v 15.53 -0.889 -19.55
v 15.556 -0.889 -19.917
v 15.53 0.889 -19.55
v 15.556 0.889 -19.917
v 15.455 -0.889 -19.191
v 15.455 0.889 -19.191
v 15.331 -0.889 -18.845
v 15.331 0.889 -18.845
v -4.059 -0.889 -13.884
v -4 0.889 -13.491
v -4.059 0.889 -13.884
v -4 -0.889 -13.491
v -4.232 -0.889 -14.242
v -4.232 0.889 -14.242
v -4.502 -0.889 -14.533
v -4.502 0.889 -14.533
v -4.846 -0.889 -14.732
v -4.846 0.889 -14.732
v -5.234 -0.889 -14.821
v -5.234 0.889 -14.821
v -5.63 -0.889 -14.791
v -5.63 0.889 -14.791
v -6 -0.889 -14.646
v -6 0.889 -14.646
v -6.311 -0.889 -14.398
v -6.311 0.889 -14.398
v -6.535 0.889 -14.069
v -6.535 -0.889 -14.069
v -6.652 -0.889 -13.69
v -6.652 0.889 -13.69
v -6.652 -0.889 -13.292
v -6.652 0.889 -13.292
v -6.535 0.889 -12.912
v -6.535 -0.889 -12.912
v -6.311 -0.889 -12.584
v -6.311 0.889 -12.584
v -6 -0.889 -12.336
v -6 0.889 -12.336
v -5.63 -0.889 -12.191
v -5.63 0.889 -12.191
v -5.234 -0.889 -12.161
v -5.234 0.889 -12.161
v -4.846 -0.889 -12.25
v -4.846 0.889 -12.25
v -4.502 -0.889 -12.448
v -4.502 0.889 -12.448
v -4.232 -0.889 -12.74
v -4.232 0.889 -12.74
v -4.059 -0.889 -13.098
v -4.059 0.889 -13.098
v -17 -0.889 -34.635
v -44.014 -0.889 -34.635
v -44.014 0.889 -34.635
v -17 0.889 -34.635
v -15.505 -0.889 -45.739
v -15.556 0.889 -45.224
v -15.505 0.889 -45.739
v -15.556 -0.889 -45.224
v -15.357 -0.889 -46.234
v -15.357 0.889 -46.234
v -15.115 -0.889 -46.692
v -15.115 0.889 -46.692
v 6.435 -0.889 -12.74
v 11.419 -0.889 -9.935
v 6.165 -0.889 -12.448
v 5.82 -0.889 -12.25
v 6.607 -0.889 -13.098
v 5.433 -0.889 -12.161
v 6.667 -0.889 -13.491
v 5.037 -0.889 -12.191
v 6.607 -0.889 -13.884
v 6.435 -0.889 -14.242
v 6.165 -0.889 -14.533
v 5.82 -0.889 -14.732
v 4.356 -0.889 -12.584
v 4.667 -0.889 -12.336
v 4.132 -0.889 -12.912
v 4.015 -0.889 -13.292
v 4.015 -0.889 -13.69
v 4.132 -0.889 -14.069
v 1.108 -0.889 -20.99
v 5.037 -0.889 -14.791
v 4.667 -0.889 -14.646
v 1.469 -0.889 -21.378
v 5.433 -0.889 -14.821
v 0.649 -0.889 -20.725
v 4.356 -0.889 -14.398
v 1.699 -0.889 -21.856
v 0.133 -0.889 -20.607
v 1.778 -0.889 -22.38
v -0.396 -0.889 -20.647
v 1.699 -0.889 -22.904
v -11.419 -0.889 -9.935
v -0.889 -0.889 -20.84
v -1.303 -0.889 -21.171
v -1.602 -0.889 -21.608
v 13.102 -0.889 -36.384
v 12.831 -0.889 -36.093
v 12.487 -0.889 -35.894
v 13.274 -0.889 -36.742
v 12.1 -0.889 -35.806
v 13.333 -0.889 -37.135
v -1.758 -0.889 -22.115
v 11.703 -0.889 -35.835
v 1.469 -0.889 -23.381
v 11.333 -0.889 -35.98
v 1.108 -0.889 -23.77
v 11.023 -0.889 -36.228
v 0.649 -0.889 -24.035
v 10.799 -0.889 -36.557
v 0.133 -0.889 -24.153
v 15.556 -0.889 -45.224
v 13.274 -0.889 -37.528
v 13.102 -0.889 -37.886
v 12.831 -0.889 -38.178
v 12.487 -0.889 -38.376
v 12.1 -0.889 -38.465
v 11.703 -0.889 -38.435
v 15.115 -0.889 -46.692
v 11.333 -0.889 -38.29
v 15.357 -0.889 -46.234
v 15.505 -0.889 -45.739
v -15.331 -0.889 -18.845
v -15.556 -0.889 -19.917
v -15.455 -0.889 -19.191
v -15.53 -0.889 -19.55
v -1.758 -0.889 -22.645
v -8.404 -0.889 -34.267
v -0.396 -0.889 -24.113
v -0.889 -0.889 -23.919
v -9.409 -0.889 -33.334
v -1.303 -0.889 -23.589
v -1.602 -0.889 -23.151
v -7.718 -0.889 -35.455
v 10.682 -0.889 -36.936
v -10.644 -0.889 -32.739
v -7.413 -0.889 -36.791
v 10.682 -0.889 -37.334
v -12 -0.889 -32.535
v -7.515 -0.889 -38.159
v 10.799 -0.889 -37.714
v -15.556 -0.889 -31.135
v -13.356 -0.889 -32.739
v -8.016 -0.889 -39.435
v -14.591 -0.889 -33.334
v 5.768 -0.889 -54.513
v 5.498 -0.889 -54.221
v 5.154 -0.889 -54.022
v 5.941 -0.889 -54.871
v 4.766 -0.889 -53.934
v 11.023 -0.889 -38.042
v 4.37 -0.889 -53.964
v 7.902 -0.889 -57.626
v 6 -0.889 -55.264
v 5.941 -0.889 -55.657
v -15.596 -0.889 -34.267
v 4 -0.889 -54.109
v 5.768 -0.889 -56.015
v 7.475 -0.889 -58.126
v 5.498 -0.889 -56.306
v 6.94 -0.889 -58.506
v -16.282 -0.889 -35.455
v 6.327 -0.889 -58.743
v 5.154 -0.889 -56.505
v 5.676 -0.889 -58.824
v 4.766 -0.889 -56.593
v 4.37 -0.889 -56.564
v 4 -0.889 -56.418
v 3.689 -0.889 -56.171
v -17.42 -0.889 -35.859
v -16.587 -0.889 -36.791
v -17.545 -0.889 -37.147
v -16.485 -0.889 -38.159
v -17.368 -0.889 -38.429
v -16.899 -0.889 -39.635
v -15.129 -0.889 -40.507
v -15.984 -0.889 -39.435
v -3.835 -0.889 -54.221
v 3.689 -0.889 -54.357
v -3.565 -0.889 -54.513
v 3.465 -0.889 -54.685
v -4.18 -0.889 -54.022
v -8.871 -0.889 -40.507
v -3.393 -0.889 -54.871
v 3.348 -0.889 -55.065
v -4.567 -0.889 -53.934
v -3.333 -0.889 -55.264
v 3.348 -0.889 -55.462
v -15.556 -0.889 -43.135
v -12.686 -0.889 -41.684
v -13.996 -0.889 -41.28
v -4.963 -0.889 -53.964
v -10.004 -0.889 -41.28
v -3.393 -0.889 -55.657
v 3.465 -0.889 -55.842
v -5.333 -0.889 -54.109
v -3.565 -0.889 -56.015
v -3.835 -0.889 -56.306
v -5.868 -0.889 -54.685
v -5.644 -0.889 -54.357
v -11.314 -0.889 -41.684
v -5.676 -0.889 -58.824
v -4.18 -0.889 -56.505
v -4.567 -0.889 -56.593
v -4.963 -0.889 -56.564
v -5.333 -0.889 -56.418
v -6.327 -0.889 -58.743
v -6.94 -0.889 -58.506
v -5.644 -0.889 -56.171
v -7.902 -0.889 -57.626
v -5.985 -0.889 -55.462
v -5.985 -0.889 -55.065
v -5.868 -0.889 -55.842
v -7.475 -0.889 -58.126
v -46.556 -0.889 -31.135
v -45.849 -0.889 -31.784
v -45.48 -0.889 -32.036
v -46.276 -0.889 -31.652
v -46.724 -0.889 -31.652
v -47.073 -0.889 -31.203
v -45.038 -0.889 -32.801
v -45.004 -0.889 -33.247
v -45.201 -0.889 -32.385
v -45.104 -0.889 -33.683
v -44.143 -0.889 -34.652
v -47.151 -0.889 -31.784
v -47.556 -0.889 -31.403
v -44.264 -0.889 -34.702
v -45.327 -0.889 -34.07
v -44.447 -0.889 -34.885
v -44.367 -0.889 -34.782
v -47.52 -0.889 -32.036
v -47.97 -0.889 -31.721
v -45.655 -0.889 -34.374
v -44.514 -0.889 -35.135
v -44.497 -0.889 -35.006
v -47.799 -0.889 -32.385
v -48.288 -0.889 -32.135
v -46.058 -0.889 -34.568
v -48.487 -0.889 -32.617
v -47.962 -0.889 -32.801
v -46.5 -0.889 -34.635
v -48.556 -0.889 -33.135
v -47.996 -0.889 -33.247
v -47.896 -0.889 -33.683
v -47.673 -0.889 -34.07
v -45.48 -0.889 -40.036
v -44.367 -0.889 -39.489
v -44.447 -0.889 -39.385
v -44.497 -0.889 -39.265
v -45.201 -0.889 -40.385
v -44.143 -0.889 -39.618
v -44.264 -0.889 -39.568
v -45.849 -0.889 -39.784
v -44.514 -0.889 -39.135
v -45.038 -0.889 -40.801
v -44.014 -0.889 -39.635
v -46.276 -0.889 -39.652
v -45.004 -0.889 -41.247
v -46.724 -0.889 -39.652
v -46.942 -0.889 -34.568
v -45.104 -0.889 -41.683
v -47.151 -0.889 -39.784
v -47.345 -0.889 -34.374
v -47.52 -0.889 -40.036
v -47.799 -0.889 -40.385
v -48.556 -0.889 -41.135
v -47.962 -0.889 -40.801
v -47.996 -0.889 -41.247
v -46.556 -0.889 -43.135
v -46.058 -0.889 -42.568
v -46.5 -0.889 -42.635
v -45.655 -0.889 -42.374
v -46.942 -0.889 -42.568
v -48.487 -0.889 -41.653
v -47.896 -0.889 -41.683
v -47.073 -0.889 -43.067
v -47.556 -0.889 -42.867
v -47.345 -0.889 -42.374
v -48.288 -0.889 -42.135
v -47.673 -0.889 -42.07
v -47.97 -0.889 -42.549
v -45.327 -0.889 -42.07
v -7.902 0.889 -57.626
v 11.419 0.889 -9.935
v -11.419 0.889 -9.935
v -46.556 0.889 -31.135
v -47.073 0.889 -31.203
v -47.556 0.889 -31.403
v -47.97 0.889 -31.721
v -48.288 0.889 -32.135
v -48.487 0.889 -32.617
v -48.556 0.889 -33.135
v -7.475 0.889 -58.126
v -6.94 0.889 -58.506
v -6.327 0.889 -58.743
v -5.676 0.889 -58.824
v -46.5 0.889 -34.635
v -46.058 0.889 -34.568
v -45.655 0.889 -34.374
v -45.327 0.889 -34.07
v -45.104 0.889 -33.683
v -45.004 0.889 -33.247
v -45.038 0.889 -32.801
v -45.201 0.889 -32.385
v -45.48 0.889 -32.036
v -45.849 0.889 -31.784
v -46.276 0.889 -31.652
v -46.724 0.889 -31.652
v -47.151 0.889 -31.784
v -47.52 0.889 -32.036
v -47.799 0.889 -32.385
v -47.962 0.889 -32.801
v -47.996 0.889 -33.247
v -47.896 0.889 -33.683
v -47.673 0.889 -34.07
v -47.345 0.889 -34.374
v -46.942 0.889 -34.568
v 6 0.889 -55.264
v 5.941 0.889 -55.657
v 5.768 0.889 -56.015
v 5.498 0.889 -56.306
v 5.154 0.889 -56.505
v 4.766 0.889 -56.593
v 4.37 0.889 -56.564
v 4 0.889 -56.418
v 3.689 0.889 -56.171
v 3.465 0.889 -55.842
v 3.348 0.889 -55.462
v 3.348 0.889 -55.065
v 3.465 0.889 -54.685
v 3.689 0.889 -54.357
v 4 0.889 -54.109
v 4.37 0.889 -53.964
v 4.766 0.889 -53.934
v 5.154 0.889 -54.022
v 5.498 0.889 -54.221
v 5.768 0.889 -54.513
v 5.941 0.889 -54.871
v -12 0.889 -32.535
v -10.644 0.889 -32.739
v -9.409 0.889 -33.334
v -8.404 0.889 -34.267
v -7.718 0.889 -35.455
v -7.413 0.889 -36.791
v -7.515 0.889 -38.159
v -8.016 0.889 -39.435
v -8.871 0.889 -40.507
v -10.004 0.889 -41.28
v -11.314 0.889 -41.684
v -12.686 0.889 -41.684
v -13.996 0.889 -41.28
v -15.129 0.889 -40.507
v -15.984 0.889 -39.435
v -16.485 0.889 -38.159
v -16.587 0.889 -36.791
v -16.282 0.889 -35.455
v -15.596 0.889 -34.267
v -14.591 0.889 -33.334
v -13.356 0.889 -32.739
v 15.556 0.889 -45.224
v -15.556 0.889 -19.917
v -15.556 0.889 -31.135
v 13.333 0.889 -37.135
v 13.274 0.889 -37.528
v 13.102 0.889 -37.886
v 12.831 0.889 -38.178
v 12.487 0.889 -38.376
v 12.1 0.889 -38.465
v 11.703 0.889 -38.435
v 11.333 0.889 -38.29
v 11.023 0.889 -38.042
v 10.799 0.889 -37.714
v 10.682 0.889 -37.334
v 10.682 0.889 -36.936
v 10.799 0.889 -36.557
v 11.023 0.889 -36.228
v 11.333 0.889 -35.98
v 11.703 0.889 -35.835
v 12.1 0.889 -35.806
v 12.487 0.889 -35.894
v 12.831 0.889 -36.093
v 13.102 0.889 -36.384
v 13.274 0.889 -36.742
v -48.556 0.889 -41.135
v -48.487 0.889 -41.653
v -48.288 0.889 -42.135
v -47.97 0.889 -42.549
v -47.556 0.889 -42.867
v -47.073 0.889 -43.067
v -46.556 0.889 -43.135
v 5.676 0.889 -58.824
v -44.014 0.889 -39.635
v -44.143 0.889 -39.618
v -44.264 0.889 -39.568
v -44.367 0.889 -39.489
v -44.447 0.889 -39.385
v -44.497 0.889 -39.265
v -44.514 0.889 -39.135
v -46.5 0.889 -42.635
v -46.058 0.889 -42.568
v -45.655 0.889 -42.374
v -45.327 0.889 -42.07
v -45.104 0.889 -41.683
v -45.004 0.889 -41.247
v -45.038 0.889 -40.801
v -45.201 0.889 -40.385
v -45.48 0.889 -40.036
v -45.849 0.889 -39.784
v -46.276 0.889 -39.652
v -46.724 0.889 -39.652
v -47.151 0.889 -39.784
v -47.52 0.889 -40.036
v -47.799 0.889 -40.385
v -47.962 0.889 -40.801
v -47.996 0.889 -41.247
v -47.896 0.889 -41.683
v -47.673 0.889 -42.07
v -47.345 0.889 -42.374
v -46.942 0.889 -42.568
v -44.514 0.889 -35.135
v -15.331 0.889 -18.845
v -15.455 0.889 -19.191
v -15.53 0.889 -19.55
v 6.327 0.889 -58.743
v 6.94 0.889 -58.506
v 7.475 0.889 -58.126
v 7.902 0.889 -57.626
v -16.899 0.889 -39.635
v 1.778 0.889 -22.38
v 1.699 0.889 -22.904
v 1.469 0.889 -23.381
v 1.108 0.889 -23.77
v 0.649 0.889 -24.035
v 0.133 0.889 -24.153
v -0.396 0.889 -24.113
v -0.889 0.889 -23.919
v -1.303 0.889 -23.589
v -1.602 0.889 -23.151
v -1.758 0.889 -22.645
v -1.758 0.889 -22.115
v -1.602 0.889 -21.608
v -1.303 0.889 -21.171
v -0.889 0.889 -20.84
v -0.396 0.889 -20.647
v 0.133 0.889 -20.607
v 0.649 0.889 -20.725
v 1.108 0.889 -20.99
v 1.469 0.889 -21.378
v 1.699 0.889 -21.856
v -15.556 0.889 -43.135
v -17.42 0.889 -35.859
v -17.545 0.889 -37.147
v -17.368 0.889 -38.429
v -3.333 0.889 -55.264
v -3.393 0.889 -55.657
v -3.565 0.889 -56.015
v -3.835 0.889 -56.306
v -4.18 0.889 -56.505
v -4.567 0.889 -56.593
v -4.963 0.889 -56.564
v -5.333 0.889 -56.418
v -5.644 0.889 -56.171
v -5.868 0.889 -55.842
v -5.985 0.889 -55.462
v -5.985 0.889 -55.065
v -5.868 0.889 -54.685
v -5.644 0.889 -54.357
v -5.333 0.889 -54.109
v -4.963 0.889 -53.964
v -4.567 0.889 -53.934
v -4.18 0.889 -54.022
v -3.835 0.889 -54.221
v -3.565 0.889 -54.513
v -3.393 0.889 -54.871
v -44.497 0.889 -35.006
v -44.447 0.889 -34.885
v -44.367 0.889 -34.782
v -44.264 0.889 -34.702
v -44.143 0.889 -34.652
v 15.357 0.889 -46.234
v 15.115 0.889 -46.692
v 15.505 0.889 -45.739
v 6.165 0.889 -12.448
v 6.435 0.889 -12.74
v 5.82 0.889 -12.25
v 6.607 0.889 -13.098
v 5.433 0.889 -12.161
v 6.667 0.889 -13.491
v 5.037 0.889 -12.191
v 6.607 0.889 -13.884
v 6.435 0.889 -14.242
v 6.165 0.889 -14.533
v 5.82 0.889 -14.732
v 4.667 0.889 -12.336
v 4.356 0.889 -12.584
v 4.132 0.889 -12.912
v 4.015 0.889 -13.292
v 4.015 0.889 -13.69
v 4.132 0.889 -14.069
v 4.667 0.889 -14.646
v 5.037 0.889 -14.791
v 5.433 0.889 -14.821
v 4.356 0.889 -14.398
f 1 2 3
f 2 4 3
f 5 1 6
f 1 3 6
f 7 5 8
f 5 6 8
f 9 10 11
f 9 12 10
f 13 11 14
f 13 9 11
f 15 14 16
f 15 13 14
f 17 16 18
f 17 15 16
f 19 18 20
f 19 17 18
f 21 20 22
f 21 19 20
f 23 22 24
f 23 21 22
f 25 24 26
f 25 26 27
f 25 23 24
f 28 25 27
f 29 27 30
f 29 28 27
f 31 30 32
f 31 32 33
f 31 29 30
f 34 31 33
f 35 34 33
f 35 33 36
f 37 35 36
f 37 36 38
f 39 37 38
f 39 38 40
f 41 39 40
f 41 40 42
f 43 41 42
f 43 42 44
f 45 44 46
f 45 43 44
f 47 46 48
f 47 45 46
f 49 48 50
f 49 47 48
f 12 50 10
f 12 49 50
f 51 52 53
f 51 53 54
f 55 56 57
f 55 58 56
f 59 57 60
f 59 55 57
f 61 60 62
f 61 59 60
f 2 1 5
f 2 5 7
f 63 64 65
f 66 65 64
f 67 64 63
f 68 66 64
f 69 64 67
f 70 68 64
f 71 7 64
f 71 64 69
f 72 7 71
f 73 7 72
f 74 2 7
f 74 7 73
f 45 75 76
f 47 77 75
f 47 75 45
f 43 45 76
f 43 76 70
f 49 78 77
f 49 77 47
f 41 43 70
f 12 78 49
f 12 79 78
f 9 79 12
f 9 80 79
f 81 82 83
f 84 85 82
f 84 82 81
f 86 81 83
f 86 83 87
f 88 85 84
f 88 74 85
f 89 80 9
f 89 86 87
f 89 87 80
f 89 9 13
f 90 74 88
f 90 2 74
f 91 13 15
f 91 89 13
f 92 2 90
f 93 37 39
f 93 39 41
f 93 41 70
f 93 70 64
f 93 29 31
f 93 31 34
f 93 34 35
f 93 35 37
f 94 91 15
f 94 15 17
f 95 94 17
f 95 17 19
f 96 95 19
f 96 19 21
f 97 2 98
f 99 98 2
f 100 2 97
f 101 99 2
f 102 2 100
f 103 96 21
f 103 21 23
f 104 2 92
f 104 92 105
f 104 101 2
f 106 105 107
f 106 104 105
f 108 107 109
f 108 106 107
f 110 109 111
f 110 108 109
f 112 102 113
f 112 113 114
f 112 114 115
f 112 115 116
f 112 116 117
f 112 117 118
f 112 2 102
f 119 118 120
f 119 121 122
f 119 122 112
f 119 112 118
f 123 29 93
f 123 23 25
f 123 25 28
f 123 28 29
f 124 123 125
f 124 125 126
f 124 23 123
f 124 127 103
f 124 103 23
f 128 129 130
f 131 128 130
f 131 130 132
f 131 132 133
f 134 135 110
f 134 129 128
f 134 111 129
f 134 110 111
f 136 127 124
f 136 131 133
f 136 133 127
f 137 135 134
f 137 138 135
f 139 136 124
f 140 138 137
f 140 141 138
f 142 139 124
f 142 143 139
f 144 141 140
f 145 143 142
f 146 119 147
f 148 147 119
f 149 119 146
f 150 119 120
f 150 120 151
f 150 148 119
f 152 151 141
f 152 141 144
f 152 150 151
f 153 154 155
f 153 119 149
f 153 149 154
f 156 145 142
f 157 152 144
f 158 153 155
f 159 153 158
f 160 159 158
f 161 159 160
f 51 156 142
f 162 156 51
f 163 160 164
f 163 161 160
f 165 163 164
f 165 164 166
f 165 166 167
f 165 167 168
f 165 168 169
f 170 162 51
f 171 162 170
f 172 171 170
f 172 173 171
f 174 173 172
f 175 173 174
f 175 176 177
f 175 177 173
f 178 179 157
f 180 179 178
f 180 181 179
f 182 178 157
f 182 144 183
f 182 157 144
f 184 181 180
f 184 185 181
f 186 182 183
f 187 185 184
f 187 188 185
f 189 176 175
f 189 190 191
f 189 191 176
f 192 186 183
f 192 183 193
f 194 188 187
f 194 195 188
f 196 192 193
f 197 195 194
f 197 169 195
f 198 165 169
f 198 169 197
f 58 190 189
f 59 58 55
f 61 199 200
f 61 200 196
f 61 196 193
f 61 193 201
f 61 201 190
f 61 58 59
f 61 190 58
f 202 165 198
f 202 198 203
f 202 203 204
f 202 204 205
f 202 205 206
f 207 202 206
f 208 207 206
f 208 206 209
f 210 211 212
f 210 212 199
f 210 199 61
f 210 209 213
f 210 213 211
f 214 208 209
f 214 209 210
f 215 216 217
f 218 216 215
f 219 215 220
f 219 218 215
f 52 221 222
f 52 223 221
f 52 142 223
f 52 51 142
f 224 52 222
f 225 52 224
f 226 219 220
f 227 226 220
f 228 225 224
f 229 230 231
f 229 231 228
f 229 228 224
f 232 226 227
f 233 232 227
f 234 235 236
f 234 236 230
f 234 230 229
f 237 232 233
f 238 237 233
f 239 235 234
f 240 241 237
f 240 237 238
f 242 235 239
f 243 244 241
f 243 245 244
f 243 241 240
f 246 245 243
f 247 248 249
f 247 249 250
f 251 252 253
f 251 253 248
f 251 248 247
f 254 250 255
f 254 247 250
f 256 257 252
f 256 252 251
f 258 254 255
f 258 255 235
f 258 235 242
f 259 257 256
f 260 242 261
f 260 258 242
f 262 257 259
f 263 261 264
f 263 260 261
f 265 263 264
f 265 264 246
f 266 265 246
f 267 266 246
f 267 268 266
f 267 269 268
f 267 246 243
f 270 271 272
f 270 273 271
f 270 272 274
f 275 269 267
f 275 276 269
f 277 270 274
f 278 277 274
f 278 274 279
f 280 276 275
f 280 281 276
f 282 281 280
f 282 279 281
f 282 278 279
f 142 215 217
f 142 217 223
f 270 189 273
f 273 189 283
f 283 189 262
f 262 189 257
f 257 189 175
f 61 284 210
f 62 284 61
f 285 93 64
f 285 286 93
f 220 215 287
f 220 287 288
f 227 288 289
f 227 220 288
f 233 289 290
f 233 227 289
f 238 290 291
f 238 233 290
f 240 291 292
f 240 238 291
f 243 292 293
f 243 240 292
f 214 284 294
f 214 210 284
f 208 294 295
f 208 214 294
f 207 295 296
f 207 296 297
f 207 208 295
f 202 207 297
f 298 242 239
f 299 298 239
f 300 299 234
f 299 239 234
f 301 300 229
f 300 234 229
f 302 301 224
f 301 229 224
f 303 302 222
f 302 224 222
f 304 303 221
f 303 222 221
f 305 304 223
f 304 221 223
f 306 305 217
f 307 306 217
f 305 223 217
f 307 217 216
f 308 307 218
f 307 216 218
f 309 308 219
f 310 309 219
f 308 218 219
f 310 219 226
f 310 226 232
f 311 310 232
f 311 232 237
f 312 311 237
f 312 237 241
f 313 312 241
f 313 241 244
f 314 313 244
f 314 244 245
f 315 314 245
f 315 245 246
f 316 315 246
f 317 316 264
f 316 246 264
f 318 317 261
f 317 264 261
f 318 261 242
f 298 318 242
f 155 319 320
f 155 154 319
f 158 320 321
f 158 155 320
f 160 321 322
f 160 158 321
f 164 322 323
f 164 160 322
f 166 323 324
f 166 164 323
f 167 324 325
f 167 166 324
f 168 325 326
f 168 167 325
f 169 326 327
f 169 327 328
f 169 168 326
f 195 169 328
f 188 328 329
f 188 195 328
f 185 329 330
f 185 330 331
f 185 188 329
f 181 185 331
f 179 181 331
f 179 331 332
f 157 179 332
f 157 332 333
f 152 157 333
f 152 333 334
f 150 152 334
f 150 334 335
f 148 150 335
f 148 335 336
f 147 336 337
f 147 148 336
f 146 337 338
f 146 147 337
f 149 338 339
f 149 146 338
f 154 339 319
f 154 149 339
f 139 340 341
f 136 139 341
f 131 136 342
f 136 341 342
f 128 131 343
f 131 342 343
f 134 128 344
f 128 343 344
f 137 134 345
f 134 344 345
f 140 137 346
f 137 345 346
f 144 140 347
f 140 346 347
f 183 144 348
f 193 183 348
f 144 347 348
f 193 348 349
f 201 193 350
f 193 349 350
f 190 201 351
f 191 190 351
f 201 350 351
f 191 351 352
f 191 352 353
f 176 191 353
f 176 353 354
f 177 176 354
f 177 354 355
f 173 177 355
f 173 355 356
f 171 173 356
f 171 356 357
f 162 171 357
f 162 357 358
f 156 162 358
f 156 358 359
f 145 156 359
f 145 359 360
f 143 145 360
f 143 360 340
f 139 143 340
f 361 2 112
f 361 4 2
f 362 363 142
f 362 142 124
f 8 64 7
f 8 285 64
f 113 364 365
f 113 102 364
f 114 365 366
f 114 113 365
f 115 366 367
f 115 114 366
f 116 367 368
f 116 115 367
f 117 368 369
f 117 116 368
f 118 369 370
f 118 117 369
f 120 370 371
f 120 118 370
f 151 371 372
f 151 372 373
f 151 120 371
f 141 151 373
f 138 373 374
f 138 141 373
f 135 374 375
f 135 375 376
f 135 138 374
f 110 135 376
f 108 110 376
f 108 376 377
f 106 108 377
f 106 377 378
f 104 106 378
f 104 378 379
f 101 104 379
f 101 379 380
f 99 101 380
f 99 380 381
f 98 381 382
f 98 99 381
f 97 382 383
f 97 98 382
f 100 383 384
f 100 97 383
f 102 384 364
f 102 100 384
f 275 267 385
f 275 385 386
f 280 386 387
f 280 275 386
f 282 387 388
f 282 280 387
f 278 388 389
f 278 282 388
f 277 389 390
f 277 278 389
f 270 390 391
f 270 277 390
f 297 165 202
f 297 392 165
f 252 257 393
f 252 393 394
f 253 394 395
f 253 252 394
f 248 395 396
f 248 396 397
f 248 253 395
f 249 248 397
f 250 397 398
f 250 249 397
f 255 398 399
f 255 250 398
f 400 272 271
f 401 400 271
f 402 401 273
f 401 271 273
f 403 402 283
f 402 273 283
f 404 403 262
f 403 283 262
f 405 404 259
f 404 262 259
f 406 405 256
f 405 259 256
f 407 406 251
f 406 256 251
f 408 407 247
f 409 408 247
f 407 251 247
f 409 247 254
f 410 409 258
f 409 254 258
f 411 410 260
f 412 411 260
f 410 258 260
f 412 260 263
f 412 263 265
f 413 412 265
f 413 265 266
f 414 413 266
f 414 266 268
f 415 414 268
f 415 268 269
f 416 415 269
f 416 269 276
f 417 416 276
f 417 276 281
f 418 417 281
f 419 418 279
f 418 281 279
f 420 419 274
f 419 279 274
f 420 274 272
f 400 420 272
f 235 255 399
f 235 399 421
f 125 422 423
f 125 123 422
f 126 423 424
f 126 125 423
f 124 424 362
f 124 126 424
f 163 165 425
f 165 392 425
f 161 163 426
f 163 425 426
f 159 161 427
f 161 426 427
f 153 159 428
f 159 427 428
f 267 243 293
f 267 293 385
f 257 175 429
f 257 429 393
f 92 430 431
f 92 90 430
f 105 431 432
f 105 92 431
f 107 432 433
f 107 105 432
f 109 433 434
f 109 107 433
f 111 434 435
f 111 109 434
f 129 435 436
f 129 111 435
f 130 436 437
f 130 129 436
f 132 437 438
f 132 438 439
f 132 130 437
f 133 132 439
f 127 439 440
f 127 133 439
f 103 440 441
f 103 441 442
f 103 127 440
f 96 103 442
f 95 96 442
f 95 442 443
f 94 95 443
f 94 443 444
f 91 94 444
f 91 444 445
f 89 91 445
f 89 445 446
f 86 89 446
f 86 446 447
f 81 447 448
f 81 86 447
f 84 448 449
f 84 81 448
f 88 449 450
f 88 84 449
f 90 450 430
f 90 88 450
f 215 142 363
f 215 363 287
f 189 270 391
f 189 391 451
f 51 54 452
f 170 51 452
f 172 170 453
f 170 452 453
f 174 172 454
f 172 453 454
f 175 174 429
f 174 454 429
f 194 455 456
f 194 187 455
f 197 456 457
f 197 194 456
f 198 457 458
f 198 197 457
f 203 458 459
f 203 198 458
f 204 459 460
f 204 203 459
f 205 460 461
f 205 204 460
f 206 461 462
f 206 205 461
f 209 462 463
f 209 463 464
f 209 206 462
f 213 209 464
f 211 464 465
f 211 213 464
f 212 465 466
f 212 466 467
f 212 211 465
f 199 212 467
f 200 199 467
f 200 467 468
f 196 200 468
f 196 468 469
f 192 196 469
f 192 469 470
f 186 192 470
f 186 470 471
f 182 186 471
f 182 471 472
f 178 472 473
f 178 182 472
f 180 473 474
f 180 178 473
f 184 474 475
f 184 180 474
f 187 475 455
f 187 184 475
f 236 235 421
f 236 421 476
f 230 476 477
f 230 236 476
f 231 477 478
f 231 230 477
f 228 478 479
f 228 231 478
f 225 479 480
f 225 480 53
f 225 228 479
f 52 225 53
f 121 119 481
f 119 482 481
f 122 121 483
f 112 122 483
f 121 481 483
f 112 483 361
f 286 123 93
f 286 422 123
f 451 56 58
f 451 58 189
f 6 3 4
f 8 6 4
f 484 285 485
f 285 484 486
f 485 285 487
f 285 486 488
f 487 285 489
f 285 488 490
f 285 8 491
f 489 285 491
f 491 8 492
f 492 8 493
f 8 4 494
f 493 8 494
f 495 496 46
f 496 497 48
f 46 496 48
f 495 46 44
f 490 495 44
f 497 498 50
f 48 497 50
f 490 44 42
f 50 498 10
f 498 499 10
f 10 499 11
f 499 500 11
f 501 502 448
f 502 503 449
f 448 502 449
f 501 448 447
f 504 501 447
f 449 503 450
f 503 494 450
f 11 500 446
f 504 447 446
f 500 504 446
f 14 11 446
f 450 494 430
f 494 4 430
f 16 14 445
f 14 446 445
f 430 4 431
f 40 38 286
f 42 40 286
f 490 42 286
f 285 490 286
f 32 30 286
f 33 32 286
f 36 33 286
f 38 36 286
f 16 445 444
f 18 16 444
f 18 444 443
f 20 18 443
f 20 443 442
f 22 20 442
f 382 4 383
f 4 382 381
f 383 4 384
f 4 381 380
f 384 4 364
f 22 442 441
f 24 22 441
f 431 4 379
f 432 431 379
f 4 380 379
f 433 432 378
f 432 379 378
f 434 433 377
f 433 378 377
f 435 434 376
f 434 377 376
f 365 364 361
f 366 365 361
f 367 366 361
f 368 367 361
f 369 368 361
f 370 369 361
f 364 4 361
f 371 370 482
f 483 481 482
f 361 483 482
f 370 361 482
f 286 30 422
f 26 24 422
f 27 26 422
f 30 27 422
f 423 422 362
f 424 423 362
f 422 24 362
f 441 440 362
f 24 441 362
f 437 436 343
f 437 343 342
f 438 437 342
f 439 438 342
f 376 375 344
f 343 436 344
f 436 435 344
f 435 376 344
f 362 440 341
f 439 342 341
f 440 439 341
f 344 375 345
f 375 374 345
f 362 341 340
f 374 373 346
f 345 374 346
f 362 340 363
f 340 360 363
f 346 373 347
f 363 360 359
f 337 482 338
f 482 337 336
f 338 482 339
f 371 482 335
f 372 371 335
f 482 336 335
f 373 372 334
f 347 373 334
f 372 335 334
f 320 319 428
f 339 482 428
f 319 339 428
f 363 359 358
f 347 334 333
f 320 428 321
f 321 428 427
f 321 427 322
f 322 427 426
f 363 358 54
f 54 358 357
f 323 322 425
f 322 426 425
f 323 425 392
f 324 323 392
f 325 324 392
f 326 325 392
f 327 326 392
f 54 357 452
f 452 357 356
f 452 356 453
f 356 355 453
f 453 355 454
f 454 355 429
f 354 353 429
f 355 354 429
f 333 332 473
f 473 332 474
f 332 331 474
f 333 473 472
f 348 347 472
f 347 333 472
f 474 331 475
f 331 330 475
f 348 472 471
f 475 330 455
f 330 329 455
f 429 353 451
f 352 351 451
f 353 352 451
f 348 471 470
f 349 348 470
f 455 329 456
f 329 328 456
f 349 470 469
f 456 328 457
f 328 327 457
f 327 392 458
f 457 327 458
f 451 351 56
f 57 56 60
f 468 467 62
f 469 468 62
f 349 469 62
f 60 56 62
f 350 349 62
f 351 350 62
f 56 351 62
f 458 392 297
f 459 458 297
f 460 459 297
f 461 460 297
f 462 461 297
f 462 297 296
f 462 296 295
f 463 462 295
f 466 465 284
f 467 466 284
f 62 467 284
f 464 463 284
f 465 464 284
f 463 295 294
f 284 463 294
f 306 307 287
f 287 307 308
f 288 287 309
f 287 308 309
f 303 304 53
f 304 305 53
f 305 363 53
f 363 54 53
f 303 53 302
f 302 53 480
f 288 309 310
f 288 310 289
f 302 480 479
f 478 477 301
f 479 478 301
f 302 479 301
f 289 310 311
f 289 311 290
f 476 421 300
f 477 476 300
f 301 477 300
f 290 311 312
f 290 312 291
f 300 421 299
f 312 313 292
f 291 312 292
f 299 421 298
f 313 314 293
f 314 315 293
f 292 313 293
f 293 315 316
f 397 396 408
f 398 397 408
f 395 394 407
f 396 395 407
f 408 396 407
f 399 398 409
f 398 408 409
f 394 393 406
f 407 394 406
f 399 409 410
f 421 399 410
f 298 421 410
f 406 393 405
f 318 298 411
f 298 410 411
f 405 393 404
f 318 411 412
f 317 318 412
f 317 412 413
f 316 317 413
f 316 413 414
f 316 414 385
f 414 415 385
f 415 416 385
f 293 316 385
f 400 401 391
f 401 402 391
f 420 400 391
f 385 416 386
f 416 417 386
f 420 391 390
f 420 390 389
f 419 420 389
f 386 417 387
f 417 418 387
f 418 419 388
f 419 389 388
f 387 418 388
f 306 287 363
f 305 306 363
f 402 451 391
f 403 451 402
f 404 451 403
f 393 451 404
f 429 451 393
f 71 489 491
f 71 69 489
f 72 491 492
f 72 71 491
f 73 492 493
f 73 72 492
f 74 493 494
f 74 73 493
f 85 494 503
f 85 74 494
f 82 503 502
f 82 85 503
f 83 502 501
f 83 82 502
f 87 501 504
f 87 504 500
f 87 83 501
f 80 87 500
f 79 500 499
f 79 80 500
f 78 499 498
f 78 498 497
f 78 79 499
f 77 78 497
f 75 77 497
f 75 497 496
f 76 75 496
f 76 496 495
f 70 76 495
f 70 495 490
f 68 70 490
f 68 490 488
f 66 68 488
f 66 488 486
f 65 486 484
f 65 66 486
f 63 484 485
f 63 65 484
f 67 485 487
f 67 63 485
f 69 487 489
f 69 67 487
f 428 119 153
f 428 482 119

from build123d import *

# Parameters (mm, degrees)
CROQUIS1_R              = 1.5
CROQUIS1_R_2            = 2
SALIENTE_EXTRUIR1_DEPTH = 1
REDONDEO1_R             = 3
SCALE1_SCALE            = 0.888888889
SKETCH1_R               = 1.5
BOSS_EXTRUDE1_DEPTH     = 1.777777778
BOSS_EXTRUDE2_DEPTH     = 1.777777778
SKETCH3_R               = 4.6
CUT_EXTRUDE1_DEPTH      = 10


with BuildPart() as part:
    # Croquis1 → Saliente-Extruir1 (new, symmetric)
    with BuildSketch(Plane(origin=(0, 0, 0), x_dir=(1, 0, 0), z_dir=(0, 1, 0))):
        Polygon((-12.846620717, 7), (12.846620717, 7), (17.5, 17.599715907), (17.5, 47.599715907), (8, 62), (-8, 62), (-17.5, 47.599715907), (-17.5, 17.599715907), align=None)
        with Locations((-6, 11)):
            Circle(CROQUIS1_R, mode=Mode.SUBTRACT)
        with Locations((6, 11)):
            Circle(CROQUIS1_R, mode=Mode.SUBTRACT)
        with Locations((0, 21)):
            Circle(CROQUIS1_R_2, mode=Mode.SUBTRACT)
        with Locations((-13.5, 37.599715907)):
            Circle(CROQUIS1_R, mode=Mode.SUBTRACT)
        with Locations((-5.25, 57.994261746)):
            Circle(CROQUIS1_R, mode=Mode.SUBTRACT)
        with Locations((13.5, 37.599715907)):
            Circle(CROQUIS1_R, mode=Mode.SUBTRACT)
        with Locations((5.25, 57.994261746)):
            Circle(CROQUIS1_R, mode=Mode.SUBTRACT)
    extrude(amount=SALIENTE_EXTRUIR1_DEPTH, both=True)

    # Redondeo1
    redondeo1_edges = [part.edges().sort_by_distance(p)[0] for p in [
        (17.5, 0, -17.599715907),
        (-17.5, 0, -17.599715907),
        (-17.5, 0, -47.599715907),
        (-8, 0, -62),
        (8, 0, -62),
        (17.5, 0, -47.599715907),
    ]]
    fillet(redondeo1_edges, radius=REDONDEO1_R)


with BuildPart() as part_1:
    # Scale1: scaled about (0, 0, -33.418377338)
    add(part.part.scale(SCALE1_SCALE).moved(Location((0, 0, -3.713153038))))

    # Sketch1 → Boss-Extrude1 (add)
    with BuildSketch(Plane.XZ.offset(0.888888889)):
        with BuildLine():
            Line((-15.555555556, -31.135122733), (-46.555555556, -31.135122733))
            ThreePointArc((-46.555555556, -31.135122733), (-47.969769118, -31.72090917), (-48.555555556, -33.135122733))
            Line((-48.555555556, -33.135122733), (-48.555555556, -41.135122733))
            ThreePointArc((-48.555555556, -41.135122733), (-47.969769118, -42.549336295), (-46.555555556, -43.135122733))
            Line((-46.555555556, -43.135122733), (-15.555555556, -43.135122733))
            Line((-15.555555556, -43.135122733), (-15.555555556, -39.635122733))
            Line((-15.555555556, -39.635122733), (-44.013890567, -39.635122733))
            ThreePointArc((-44.013890567, -39.635122733), (-44.367443957, -39.488676123), (-44.513890567, -39.135122733))
            Line((-44.513890567, -39.135122733), (-44.513890567, -35.135122733))
            ThreePointArc((-44.513890567, -35.135122733), (-44.367443957, -34.781569342), (-44.013890567, -34.635122733))
            Line((-44.013890567, -34.635122733), (-15.555555556, -34.635122733))
            Line((-15.555555556, -34.635122733), (-15.555555556, -31.135122733))
        make_face()
        with Locations(Location((-46.5, -33.135122733, 0), (0, 0, 270))):
            Circle(SKETCH1_R, mode=Mode.SUBTRACT)
        with Locations(Location((-46.5, -41.135122733, 0), (0, 0, 270))):
            Circle(SKETCH1_R, mode=Mode.SUBTRACT)
    extrude(amount=-BOSS_EXTRUDE1_DEPTH)

    # Sketch2 → Boss-Extrude2 (add)
    with BuildSketch(Plane(origin=(0, 0.888888889, 0), x_dir=(1, 0, 0), z_dir=(0, 1, 0))):
        with BuildLine():
            Line((-16.898979486, 39.635122733), (-15.555555556, 39.635122733))
            Line((-15.555555556, 39.635122733), (-15.555555556, 34.635122733))
            Line((-15.555555556, 34.635122733), (-17.0003696, 34.635122733))
            ThreePointArc((-17.0003696, 34.635122733), (-17.54520316, 37.147198875), (-16.898979486, 39.635122733))
        make_face()
    extrude(amount=-BOSS_EXTRUDE2_DEPTH)

    # Sketch3 → Cut-Extrude1 (cut)
    with BuildSketch(Plane(origin=(0, 0.888888889, 0), x_dir=(1, 0, 0), z_dir=(0, 1, 0))):
        with Locations(Location((-12, 37.135122733, 0), (0, 0, 270))):
            Circle(SKETCH3_R)
    extrude(amount=-CUT_EXTRUDE1_DEPTH, mode=Mode.SUBTRACT)


solid = part_1.part
